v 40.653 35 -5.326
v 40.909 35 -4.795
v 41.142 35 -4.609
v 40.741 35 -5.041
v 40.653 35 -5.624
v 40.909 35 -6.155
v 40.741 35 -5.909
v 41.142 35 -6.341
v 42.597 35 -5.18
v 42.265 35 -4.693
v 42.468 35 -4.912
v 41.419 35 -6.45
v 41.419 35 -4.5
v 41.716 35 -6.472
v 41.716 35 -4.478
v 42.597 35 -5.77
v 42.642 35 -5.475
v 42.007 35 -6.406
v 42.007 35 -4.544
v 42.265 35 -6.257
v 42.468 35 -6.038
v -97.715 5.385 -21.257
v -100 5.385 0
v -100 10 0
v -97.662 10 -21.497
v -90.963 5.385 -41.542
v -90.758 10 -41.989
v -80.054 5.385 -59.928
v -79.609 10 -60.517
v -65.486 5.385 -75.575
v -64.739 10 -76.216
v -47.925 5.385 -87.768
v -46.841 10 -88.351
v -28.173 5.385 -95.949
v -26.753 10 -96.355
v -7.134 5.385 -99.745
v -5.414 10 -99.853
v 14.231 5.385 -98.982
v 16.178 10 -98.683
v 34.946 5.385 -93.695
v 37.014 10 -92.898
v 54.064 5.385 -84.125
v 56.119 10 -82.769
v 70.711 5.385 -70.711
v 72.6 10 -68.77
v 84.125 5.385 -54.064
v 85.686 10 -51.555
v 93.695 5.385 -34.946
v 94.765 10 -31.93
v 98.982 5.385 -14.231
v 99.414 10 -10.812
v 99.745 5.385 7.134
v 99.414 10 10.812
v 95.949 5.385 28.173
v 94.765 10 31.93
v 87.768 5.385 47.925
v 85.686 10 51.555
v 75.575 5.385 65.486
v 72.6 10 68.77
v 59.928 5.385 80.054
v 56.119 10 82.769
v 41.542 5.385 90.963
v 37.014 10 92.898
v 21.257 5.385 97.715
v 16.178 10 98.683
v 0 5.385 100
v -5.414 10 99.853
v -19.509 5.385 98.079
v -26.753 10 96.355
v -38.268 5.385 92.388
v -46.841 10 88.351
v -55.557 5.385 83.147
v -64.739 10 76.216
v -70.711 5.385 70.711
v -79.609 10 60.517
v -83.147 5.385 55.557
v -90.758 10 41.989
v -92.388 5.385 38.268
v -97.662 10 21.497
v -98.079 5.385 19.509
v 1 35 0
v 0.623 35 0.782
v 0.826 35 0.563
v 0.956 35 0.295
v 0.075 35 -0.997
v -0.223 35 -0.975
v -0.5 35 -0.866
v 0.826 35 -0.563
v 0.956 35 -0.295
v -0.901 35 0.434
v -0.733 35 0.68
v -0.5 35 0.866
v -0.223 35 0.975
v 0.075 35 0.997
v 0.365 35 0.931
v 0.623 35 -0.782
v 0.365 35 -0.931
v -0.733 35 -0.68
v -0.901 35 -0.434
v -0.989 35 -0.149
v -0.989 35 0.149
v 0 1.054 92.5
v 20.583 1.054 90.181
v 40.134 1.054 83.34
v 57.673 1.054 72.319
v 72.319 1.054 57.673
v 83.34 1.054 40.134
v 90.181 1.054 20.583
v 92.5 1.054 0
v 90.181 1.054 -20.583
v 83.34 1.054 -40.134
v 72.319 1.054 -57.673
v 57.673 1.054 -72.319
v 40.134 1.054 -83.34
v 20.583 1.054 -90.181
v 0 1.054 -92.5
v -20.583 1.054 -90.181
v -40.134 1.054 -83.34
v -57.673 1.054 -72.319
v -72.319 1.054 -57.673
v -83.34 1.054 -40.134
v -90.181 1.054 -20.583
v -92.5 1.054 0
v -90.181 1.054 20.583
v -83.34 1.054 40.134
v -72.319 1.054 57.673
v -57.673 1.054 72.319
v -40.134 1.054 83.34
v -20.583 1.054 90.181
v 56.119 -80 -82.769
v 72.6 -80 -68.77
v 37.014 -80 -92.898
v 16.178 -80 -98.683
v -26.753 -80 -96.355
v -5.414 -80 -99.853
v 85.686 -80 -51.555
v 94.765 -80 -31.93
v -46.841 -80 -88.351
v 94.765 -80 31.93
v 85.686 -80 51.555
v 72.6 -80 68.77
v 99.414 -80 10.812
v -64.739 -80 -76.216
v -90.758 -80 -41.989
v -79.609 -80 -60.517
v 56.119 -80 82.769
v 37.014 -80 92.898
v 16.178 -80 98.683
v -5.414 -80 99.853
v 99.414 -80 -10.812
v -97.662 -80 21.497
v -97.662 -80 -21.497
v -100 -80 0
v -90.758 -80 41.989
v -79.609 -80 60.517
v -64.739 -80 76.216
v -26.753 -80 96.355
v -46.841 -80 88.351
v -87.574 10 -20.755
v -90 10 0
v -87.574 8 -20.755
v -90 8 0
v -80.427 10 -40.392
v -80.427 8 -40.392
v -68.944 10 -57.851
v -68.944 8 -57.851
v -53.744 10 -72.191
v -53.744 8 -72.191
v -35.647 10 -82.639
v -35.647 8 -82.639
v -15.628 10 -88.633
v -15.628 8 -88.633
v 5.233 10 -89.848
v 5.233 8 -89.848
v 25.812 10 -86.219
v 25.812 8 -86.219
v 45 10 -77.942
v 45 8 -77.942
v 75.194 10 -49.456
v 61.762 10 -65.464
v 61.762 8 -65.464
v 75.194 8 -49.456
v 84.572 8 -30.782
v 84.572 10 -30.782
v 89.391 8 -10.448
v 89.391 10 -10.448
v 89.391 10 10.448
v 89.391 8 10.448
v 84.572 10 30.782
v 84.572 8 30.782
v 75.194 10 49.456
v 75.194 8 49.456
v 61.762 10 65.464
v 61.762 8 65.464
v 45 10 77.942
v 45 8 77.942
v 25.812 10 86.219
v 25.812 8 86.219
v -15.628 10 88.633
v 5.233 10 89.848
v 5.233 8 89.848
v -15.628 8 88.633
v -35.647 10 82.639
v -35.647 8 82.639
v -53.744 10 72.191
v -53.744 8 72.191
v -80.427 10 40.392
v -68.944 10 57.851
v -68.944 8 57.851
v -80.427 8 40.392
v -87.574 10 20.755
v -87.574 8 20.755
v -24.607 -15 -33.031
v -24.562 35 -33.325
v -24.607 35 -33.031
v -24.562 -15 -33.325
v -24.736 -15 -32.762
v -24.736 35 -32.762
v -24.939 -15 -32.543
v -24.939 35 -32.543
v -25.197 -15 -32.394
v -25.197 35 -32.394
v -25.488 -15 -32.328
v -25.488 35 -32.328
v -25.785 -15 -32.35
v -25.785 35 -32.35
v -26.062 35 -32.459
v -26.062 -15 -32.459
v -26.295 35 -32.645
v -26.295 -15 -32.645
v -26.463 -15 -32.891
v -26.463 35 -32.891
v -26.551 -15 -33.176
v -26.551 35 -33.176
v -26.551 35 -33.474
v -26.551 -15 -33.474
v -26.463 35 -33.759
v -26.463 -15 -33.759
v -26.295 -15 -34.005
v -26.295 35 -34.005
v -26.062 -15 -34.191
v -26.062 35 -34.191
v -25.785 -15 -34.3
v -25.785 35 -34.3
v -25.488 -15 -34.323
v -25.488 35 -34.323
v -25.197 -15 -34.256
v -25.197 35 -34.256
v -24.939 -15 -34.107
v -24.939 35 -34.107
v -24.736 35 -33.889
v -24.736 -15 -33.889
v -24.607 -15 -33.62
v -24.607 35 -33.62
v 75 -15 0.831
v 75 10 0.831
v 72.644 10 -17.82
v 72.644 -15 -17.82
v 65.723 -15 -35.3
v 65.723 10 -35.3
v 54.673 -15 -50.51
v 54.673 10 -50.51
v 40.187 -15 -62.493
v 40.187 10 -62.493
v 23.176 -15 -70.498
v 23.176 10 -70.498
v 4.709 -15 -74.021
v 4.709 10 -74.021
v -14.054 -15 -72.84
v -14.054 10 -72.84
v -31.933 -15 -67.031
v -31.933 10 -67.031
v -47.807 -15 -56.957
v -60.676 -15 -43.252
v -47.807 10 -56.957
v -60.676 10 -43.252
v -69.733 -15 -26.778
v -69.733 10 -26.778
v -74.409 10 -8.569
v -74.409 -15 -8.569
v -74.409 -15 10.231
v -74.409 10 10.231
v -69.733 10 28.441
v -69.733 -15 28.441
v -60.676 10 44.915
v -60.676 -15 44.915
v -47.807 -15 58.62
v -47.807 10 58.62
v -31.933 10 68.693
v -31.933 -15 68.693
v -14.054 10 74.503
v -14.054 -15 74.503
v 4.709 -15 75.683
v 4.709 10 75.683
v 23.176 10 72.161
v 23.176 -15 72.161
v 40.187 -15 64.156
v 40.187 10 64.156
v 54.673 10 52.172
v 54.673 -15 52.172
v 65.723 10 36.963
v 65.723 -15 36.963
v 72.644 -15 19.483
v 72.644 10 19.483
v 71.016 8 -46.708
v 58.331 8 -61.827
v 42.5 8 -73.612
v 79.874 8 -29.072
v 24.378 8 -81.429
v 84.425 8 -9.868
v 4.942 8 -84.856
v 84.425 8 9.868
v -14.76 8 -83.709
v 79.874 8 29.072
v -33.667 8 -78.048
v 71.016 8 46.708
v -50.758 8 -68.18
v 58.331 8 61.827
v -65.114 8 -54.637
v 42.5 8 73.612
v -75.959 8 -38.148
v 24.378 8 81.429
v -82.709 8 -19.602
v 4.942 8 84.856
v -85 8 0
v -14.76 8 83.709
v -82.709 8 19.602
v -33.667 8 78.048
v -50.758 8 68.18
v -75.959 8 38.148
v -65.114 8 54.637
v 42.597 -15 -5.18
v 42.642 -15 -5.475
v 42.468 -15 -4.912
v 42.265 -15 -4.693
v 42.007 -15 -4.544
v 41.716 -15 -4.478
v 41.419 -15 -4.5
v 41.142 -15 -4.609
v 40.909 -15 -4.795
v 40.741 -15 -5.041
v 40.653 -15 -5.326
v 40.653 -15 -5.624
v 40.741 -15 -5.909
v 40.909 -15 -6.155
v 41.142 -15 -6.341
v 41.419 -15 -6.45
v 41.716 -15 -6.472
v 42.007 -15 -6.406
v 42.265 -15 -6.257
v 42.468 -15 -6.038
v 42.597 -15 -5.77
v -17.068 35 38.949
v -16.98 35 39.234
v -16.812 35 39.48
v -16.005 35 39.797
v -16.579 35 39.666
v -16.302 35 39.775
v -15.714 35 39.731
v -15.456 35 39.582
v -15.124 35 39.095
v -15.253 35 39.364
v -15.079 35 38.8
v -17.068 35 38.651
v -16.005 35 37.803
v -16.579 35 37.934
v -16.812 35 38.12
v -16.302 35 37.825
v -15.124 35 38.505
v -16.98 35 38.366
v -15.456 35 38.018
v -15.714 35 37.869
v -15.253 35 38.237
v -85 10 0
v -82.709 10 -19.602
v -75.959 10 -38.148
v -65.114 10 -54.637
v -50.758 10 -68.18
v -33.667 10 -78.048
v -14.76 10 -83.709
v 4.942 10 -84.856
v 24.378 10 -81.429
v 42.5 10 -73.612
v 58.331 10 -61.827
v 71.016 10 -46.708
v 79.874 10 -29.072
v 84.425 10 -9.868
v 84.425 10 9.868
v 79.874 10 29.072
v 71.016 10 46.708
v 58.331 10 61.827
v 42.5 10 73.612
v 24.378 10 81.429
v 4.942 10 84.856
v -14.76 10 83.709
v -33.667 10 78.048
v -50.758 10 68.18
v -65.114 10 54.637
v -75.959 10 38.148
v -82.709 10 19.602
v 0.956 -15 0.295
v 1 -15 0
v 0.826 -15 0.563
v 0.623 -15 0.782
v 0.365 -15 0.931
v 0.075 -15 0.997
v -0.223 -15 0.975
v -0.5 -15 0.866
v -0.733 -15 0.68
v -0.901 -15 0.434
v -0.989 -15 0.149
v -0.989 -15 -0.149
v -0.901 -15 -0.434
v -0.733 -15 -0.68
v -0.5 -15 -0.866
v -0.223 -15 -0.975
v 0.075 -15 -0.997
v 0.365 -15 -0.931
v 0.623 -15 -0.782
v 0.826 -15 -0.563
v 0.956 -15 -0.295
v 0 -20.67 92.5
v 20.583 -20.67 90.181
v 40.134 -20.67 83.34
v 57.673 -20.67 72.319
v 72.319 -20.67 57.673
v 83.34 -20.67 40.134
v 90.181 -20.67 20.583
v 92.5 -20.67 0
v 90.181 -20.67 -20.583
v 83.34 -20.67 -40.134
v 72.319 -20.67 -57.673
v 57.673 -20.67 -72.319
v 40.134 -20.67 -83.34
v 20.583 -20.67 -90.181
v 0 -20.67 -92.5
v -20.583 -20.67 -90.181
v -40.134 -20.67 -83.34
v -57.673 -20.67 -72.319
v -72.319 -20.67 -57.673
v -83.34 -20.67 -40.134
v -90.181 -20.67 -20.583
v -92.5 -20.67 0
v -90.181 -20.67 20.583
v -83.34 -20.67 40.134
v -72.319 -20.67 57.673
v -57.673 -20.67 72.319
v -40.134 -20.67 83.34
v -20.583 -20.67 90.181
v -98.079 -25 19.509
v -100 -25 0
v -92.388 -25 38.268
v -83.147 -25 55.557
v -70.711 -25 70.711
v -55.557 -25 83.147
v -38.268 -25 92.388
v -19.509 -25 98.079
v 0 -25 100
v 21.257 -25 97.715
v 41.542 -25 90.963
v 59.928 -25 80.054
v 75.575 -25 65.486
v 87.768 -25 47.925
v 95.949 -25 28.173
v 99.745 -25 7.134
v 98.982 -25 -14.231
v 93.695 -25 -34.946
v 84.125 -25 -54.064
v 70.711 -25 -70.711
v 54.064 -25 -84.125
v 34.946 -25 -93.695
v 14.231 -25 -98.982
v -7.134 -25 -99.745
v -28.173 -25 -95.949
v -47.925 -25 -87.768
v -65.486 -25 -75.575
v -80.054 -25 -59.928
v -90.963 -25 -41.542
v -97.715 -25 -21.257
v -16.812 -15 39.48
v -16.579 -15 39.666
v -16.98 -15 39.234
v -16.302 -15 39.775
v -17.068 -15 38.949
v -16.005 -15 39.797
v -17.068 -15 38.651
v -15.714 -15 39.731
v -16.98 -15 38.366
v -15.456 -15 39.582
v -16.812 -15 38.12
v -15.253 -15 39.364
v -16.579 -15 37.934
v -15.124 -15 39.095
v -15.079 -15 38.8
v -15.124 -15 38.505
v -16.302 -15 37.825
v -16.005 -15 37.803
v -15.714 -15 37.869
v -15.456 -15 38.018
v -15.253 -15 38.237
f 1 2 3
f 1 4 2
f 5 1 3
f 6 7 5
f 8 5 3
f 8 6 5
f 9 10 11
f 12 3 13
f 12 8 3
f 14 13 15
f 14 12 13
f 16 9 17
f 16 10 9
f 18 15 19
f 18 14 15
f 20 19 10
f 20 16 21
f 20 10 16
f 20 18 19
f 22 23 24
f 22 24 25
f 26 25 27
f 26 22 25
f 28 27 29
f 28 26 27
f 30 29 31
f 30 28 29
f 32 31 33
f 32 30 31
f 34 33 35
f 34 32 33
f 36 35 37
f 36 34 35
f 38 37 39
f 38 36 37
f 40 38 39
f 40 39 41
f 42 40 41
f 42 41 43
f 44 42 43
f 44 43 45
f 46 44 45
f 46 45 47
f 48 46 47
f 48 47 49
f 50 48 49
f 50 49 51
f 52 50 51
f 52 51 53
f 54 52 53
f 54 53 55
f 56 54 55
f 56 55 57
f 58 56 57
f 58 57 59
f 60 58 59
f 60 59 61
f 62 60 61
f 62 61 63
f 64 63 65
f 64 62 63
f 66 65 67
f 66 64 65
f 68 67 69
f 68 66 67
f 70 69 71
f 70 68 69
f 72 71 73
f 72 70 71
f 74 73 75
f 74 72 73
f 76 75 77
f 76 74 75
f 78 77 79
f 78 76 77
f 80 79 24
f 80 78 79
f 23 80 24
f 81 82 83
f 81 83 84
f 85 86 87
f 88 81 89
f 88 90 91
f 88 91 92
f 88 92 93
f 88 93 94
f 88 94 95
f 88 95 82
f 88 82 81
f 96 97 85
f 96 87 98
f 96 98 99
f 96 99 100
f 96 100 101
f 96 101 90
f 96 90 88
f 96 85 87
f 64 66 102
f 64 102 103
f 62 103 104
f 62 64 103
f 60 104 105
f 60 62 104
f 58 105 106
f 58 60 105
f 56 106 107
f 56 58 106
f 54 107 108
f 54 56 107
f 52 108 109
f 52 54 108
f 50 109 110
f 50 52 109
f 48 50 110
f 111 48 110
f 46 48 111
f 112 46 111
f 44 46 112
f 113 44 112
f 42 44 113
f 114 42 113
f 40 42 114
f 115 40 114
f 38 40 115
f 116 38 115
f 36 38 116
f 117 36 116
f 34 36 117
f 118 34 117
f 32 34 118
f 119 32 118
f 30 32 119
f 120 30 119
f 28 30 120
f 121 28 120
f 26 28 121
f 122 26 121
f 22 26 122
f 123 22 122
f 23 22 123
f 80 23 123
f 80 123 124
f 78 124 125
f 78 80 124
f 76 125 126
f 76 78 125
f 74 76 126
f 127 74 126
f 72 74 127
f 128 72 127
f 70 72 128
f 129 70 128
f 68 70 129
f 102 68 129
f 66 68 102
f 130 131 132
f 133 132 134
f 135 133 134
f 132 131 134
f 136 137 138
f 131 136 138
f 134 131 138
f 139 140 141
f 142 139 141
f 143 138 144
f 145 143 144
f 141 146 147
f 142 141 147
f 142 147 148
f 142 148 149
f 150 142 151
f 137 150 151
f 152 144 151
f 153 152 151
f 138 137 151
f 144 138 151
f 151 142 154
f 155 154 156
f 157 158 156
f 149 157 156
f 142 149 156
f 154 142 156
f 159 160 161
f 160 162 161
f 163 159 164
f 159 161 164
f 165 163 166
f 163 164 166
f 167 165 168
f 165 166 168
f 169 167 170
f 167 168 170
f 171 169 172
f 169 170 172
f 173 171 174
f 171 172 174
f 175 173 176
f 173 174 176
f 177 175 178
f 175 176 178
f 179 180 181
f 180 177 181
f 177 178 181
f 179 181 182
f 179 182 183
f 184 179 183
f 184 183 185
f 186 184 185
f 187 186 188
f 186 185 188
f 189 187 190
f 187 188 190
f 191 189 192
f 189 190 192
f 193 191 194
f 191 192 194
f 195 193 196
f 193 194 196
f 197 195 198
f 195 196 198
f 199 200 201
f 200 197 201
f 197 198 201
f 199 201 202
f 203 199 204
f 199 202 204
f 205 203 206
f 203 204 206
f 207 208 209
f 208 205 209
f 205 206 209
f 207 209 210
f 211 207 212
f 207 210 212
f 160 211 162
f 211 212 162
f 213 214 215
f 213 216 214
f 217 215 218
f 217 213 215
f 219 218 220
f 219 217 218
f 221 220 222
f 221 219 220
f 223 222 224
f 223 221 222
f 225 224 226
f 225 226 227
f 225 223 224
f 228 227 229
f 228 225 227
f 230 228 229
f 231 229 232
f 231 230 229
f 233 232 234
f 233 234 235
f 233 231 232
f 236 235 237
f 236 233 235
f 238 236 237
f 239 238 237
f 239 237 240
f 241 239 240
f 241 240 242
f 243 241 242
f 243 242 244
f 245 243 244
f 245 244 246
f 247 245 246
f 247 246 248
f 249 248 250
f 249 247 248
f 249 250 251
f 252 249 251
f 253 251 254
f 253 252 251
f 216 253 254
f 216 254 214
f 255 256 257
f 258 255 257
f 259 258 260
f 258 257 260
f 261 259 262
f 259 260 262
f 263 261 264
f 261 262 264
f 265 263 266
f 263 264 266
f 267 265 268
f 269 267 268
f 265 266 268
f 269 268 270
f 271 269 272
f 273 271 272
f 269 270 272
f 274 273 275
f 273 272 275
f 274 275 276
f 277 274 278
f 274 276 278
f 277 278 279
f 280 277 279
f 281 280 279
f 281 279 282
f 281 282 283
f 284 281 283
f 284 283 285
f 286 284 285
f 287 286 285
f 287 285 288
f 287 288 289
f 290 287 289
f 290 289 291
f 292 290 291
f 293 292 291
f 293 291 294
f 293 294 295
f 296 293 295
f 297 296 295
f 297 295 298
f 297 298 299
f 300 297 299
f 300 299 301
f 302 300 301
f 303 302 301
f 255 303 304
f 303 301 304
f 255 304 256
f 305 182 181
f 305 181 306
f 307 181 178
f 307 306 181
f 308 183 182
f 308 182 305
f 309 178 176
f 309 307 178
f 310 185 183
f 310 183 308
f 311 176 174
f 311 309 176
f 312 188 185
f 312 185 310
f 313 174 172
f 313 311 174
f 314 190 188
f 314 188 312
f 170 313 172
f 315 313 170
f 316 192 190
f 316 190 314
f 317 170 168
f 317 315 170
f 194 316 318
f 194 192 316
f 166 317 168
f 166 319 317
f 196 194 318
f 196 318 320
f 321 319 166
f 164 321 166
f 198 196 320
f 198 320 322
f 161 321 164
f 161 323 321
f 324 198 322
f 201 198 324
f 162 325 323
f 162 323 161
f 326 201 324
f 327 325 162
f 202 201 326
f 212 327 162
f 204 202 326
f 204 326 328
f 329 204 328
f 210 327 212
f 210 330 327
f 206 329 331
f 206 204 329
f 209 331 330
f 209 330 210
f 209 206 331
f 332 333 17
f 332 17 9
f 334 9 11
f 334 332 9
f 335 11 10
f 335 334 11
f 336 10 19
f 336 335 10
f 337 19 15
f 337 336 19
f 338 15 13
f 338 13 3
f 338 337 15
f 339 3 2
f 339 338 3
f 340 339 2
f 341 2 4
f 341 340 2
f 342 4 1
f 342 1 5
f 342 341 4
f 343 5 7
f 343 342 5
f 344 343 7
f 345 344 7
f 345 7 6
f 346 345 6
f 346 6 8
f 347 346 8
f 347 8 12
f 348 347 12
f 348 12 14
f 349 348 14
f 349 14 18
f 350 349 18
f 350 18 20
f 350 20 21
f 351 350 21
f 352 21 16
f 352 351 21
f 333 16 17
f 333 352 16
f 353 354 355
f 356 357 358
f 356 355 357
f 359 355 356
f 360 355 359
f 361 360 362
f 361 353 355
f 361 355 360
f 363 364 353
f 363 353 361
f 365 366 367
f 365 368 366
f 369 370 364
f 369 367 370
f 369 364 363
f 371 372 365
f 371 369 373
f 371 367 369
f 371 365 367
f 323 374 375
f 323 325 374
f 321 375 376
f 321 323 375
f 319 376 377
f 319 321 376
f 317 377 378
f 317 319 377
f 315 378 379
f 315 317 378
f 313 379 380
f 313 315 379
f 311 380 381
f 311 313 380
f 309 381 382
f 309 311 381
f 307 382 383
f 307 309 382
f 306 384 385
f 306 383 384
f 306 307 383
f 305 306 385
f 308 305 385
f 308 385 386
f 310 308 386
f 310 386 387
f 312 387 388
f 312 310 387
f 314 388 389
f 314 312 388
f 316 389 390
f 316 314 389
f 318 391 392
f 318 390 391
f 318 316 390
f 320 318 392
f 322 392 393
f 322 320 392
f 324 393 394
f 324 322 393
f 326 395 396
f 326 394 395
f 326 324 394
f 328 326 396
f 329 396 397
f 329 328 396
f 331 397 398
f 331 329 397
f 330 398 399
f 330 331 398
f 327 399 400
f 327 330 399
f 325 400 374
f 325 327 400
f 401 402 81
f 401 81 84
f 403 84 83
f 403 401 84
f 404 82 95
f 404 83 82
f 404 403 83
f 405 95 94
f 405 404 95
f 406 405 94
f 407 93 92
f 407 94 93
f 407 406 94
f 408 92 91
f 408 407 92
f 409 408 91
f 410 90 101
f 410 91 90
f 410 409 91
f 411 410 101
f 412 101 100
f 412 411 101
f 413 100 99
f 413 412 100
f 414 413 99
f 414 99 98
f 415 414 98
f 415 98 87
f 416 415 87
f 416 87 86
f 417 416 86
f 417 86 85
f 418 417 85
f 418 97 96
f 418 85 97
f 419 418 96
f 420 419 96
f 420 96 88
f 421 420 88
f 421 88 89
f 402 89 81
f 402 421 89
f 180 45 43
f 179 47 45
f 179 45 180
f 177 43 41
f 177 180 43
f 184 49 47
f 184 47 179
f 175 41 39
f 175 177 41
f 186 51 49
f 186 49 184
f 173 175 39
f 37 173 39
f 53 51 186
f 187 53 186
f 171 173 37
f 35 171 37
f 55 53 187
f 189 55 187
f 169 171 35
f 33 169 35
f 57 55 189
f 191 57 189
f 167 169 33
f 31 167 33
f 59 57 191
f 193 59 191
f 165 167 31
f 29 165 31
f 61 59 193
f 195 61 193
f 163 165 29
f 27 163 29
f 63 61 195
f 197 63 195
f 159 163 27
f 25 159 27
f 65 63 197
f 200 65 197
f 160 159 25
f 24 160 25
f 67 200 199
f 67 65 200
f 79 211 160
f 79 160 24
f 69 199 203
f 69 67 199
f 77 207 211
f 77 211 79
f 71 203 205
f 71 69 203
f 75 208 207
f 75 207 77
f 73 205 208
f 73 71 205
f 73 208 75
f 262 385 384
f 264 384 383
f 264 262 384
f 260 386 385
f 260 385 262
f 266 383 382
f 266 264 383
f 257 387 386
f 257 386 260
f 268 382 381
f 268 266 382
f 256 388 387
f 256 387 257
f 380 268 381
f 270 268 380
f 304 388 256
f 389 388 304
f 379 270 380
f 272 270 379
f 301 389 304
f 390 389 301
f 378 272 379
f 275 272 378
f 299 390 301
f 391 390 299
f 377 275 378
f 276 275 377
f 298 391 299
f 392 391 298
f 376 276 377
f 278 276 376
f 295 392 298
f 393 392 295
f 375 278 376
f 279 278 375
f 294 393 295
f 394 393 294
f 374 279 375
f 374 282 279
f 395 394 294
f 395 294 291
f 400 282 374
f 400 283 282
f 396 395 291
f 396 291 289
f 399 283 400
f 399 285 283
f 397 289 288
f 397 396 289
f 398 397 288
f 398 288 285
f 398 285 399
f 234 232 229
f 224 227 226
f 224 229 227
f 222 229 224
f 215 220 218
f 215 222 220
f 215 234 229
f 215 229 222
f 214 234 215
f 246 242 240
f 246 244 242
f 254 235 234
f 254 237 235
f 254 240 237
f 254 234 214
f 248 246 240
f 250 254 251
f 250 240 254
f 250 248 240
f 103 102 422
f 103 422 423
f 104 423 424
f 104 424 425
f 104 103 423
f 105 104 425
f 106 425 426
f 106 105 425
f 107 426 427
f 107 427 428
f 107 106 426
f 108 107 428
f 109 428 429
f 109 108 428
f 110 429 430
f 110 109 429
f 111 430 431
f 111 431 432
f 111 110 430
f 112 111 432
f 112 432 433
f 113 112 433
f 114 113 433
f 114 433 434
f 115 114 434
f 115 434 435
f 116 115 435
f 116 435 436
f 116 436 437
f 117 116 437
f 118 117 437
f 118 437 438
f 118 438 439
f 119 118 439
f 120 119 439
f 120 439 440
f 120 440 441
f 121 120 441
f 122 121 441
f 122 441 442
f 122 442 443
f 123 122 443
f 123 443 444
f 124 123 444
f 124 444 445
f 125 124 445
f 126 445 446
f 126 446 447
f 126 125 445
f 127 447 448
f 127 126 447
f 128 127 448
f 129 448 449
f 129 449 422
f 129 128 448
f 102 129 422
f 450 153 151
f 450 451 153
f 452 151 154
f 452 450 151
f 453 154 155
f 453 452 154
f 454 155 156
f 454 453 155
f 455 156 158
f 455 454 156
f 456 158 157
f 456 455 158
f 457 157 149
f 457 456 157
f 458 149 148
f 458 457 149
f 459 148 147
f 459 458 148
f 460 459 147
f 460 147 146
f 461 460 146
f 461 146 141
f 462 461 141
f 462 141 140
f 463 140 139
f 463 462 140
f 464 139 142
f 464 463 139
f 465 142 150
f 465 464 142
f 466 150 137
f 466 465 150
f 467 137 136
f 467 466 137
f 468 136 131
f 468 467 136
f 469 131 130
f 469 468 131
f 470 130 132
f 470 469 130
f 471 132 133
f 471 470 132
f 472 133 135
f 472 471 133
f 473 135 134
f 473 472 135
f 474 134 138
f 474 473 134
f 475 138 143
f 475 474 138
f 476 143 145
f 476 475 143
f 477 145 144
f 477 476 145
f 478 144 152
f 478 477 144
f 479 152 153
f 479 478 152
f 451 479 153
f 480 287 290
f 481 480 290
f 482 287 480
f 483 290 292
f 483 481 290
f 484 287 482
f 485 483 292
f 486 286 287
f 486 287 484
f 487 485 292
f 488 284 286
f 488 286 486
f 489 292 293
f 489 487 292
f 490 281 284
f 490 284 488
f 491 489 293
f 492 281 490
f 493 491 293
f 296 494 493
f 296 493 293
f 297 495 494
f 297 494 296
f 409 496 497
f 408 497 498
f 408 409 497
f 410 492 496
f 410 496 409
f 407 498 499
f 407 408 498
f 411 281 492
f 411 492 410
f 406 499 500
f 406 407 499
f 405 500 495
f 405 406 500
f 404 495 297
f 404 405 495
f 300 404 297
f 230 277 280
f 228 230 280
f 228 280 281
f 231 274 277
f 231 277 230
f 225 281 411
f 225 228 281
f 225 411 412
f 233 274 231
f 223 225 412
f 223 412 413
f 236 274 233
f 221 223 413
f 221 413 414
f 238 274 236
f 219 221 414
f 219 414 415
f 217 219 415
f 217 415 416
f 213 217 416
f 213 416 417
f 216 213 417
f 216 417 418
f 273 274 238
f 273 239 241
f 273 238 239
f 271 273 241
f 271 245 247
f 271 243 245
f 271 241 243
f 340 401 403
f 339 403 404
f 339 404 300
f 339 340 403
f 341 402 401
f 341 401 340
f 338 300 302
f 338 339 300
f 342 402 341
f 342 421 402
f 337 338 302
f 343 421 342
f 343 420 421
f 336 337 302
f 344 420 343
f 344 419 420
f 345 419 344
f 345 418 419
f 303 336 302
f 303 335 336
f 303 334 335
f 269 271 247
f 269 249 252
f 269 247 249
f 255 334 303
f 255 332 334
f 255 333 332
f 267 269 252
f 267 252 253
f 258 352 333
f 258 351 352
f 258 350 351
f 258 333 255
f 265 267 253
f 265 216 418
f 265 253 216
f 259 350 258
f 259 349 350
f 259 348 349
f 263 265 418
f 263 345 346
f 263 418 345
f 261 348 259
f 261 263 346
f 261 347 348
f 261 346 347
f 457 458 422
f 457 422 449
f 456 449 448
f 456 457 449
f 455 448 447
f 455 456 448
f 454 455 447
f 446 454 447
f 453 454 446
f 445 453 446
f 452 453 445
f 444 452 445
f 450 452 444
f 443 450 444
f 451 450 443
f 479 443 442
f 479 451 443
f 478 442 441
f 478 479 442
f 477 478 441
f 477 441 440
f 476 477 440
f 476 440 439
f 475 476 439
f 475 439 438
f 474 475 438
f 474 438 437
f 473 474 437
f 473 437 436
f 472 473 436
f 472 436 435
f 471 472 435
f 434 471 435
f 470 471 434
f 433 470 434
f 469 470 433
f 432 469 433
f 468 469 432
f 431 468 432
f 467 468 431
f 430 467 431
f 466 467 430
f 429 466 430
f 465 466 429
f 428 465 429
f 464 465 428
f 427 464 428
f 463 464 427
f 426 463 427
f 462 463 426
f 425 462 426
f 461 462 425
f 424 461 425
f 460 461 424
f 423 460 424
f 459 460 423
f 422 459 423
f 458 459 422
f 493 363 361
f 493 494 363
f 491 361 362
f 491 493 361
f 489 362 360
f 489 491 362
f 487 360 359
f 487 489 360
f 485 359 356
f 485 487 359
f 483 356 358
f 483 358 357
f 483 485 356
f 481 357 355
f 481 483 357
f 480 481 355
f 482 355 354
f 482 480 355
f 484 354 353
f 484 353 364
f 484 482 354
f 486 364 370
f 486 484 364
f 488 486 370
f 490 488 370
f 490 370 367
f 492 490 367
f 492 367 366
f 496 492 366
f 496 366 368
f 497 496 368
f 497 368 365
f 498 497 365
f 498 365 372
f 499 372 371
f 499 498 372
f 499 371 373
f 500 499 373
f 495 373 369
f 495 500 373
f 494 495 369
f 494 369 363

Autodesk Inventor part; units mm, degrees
ref_plane "YZ Plane" through (0, 0, 0) normal (1, 0, 0) x (0, 1, 0)
ref_plane "XZ Plane" through (0, 0, 0) normal (0, 1, 0) x (-1, 0, 0)
ref_plane "XY Plane" through (0, 0, 0) normal (0, 0, 1) x (1, 0, 0)
sketch "Sketch1" plane through (0, 0, 0) normal (0, 1, 0) x (-1, 0, 0)
  circle A0 centre (0, 0) radius 100
  circle A1 centre (0, 0) radius 90
  circle A2 centre (0, 0) radius 85
  dimension "d0" = 200
  dimension "d1" = 180
  dimension "d2" = 170
extrude "Extrusion1" add sketch "Sketch1" along normal blind 8 contours A0 | A1 | A2
extrude "Extrusion2" add sketch "Sketch1" along normal blind 10
extrude "Extrusion3" add sketch "Sketch1" against normal blind 80 contours A0 | A1 | A2
sketch "Sketch2" plane through (0, 10, 0) normal (0, 1, 0) x (1, 0, 0)
  circle A0 centre (0, -0.8314) radius 75
  point P0 (0, 0)
  dimension "d9" = 150
extrude "Extrusion4" cut sketch "Sketch2" against normal blind 25
sketch "Sketch3" plane through (0, 0, 0) normal (1, 0, 0) x (0, 1, 0)
  line L0 (5.4504, 100.114) -> (0.3612, 91.2991)
  line L1 (5.4504, 100.114) -> (15.629, 100.114) construction
  line L2 (-80, 100) -> (10, 100) projected
  line L3 (-25, 100) -> (-20.6699, 92.5)
  line L4 (-25, 100) -> (-16.3397, 100) construction
  line L5 (-20.6699, 92.5) -> (1.0545, 92.5)
  line L6 (5.4504, 100.114) -> (-20.6699, 100)
  line L7 (-33.1258, 0) -> (23.7548, 0) projected
  line L8 (1.0545, 92.5) -> (-70.8596, 92.5)
  line L9 (-70.8596, 92.5) -> (-80, 100)
  point P0 (0, 0)
  point P1 (5.3846, 100)
  dimension "d12" = 120
  dimension "d13" = 60
revolve "Revolution1" cut sketch "Sketch3" angle 360 about axis through (0, -10, 0) along (0, 1, 0) contours L0 L5 L3 L2
sketch "Sketch6" plane through (0, -15, 0.8314) normal (0, 1, 0) x (1, 0, 0)
  circle A0 centre (0, 0.8314) radius 42
  circle A1 centre (-25.5623, 34.1567) radius 1
  circle A2 centre (-16.0794, -37.9688) radius 1
  circle A3 centre (41.6416, 6.3064) radius 1
  circle A4 centre (0, 0.8314) radius 1
  dimension "d32" = 84
  dimension "d33" = 2
  dimension "d36" = 360
  dimension "d40" = 2
extrude "Extrusion7" add sketch "Sketch6" along normal blind 50 contours A3 A0 | A0 A3 | A2 A0 | A0 A2 | A1 A0 | A0 A1 | A4
properties part number "Base"
